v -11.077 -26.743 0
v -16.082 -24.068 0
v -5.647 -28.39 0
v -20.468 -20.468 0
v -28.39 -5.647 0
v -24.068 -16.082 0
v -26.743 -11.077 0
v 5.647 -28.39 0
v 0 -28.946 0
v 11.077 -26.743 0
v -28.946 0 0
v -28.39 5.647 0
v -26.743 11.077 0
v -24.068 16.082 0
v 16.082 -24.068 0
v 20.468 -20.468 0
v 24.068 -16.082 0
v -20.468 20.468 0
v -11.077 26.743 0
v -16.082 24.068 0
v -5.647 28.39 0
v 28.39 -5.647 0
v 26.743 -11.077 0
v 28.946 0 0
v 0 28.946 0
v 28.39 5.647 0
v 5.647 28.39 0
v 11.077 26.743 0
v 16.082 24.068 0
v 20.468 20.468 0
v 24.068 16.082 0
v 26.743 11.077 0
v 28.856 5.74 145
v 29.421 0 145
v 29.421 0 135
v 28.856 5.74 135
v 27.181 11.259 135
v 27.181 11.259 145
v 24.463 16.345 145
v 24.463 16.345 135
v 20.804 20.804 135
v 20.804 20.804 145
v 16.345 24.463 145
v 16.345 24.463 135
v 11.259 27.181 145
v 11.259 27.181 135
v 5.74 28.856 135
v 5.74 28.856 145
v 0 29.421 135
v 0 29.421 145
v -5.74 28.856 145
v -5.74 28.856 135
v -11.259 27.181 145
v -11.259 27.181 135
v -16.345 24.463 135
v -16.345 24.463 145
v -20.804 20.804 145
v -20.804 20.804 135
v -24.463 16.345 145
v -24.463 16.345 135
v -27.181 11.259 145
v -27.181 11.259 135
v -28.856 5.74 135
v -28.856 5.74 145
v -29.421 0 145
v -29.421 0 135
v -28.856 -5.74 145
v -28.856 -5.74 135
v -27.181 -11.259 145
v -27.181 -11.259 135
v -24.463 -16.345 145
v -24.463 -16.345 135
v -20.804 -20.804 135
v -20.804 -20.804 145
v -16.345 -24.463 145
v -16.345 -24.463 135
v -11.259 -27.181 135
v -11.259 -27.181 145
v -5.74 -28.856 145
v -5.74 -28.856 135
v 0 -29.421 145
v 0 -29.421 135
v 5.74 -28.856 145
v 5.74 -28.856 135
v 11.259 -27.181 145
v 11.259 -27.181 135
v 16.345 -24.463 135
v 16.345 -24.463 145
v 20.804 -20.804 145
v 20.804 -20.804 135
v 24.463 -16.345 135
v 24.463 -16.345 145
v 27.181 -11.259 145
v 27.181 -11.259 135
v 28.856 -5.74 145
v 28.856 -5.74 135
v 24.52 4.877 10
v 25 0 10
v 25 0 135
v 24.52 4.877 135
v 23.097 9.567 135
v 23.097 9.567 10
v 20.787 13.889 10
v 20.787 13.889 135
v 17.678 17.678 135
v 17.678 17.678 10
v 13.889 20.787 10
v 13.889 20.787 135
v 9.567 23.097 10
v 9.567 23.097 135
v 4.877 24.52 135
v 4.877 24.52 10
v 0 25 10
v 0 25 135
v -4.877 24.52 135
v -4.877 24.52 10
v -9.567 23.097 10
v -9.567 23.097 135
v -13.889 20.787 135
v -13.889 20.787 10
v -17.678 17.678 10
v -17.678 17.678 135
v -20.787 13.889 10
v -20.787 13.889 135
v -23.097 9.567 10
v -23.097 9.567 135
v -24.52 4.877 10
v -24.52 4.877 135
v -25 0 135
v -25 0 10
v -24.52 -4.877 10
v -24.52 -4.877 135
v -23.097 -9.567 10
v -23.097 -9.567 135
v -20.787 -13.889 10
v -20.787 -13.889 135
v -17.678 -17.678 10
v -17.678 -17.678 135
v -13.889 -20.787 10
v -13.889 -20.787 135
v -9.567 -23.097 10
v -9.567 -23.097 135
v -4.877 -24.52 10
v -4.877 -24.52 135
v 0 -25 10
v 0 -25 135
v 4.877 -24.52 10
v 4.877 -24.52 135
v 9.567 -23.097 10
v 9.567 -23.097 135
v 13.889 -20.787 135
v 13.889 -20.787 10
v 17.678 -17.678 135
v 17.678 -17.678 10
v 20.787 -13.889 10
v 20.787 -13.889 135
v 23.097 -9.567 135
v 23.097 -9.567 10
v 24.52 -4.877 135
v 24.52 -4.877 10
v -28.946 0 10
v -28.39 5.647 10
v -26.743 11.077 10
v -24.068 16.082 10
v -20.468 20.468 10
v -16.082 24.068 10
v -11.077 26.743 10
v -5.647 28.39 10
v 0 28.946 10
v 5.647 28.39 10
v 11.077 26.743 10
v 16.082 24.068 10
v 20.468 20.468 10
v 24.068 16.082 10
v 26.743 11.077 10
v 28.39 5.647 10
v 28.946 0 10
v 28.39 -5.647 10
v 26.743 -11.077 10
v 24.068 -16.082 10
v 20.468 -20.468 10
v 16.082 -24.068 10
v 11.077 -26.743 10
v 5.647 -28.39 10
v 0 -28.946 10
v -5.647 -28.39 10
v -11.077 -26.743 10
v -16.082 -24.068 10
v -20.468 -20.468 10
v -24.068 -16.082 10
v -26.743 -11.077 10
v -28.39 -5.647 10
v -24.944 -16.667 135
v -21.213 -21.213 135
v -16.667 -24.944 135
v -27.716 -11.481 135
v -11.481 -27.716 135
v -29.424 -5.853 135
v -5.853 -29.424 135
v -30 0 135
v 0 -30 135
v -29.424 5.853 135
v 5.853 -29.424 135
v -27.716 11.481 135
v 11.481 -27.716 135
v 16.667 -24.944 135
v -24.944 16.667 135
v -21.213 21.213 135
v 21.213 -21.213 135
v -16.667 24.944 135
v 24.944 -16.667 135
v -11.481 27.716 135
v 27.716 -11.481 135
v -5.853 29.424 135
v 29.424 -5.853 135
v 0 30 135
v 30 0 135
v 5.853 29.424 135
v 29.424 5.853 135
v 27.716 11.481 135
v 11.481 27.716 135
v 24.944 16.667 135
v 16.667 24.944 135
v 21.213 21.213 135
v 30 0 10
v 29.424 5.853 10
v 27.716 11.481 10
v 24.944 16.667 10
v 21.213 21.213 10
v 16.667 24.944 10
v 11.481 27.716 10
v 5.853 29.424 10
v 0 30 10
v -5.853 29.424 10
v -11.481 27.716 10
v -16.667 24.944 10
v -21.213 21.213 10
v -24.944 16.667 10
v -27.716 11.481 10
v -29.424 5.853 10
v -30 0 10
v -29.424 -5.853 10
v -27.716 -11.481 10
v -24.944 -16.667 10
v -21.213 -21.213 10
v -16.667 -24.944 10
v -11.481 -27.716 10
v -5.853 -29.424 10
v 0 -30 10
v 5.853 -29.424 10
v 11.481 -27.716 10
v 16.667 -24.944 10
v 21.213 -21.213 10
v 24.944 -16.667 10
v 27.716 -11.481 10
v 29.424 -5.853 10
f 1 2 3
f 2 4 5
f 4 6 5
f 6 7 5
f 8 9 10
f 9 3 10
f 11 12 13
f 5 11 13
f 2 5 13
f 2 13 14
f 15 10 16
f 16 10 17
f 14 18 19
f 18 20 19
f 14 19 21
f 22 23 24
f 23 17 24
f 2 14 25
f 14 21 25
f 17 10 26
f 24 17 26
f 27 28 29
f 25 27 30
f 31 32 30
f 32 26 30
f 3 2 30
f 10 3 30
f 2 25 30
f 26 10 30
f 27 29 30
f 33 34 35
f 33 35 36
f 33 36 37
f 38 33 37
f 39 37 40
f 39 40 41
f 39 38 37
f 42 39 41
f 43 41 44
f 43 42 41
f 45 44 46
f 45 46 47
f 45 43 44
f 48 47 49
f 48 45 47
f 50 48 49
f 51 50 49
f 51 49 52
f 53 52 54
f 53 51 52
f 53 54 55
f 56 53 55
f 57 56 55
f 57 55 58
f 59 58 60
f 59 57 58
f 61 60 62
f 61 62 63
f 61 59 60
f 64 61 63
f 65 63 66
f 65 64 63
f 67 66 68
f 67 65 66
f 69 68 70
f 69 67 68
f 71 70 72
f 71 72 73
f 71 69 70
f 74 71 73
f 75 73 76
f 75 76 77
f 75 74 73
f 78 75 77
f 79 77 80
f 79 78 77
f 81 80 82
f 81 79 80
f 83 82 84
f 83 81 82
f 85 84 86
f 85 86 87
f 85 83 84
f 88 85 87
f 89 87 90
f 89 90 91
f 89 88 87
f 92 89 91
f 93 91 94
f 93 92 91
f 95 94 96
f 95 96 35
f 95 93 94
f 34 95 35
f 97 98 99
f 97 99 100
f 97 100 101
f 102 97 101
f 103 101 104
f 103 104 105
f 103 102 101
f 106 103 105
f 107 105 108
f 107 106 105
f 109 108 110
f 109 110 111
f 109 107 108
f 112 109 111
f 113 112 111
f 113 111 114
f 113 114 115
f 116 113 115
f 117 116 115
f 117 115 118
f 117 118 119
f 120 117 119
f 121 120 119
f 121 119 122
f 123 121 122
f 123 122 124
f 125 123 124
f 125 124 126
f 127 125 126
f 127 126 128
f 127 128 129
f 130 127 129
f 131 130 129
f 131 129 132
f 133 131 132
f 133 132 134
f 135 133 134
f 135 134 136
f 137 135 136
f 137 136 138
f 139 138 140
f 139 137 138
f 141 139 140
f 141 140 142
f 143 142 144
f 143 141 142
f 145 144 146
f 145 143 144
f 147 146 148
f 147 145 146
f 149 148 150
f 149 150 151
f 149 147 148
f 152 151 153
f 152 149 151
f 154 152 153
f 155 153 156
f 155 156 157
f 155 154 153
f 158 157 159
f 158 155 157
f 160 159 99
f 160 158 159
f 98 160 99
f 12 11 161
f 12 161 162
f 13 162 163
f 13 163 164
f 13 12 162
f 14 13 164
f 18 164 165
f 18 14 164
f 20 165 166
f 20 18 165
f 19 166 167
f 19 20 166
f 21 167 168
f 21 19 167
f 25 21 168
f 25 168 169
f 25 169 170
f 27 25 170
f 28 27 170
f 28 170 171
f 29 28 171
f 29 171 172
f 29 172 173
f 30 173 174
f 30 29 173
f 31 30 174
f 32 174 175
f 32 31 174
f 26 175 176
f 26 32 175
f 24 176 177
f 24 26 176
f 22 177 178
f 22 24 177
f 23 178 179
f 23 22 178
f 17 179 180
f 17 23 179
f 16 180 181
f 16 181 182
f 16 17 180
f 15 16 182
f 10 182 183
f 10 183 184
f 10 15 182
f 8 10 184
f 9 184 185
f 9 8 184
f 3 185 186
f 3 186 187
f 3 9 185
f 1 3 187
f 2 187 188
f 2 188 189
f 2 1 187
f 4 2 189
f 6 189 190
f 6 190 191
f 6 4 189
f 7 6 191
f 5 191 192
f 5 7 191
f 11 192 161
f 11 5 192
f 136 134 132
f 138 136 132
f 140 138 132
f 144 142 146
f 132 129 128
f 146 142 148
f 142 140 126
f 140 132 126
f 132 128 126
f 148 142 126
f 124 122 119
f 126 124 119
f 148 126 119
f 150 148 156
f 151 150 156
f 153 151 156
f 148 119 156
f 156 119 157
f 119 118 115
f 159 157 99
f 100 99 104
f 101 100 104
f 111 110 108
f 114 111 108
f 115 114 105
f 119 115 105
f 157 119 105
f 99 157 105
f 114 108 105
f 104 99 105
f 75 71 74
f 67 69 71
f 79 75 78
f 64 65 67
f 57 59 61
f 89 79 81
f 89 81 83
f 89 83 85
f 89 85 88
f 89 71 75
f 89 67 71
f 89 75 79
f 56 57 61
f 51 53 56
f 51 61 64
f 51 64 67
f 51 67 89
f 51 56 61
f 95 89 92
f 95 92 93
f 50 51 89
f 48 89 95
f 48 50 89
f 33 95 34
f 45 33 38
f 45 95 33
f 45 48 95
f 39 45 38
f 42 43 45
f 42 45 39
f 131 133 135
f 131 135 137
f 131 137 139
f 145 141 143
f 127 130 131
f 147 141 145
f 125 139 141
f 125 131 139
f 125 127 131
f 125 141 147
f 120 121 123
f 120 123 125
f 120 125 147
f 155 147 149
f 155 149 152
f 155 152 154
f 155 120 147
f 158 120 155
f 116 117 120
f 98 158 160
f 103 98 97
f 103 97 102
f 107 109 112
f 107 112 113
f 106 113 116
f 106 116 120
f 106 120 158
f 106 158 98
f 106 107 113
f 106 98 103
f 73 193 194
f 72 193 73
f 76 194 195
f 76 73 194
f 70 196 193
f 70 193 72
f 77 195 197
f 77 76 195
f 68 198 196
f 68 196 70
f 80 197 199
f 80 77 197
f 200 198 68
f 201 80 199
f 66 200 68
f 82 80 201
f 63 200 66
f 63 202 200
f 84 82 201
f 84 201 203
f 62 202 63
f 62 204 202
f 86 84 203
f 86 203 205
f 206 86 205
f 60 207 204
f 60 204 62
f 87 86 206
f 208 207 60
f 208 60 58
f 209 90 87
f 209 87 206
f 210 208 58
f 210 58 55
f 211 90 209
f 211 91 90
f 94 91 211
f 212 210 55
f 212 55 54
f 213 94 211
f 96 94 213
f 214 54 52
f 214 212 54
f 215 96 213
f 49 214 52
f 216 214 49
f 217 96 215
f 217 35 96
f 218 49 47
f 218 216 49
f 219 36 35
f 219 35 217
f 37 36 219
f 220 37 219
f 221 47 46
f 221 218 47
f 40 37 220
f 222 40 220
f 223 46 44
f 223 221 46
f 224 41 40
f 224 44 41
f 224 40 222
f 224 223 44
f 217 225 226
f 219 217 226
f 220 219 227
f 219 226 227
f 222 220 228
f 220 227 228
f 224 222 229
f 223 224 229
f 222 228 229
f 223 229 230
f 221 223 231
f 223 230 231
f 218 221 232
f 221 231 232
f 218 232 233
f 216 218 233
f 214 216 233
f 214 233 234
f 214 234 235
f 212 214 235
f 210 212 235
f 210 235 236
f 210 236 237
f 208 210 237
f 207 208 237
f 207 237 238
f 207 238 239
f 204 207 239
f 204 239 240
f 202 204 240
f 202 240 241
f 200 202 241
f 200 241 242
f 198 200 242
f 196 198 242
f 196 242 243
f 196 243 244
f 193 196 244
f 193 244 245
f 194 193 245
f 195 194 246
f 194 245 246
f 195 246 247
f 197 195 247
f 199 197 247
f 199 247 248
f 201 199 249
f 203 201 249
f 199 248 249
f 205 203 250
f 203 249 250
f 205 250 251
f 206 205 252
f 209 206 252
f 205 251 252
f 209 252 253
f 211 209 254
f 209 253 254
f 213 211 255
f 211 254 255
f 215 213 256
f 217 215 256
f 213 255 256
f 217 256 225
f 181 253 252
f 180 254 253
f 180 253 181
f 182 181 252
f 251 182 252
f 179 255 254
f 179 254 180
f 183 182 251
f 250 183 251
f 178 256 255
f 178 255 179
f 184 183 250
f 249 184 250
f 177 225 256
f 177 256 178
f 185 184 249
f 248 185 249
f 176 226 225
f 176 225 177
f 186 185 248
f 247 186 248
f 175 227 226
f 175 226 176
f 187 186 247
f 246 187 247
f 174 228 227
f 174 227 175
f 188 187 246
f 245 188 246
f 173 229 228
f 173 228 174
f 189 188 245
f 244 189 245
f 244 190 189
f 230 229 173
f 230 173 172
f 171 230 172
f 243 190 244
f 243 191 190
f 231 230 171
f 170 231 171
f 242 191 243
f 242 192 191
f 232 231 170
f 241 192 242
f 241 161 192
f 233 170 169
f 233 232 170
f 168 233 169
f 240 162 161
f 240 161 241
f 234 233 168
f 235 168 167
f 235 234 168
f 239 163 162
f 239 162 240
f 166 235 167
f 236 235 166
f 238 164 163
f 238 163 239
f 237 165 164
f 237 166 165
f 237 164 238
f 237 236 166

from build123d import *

# Parameters (mm, degrees)
SKETCH1_R           = 30
SKETCH1_R_2         = 25
BOSS_EXTRUDE1_DEPTH = 145
SKETCH2_R           = 25
BOSS_EXTRUDE2_DEPTH = 10
SKETCH3_R           = 25
BOSS_EXTRUDE3_DEPTH = 10
SKETCH11_R          = 30
SKETCH11_R_2        = 28.945980101
CUT_EXTRUDE2_DEPTH  = 10
SKETCH12_R          = 30
SKETCH12_R_2        = 29.420954363
CUT_EXTRUDE3_DEPTH  = 10


with BuildPart() as part:
    # Sketch1 → Boss-Extrude1 (new body)
    with BuildSketch(Plane.XY):
        Circle(SKETCH1_R)
        Circle(SKETCH1_R_2, mode=Mode.SUBTRACT)
    extrude(amount=BOSS_EXTRUDE1_DEPTH)

    # Sketch2 → Boss-Extrude2 (add)
    with BuildSketch(Plane.XY):
        Circle(SKETCH2_R)
    extrude(amount=BOSS_EXTRUDE2_DEPTH)

    # Sketch3 → Boss-Extrude3 (add)
    with BuildSketch(Plane.XY.offset(135)):
        Circle(SKETCH3_R)
    extrude(amount=BOSS_EXTRUDE3_DEPTH)

    # Sketch11 → Cut-Extrude2 (cut)
    with BuildSketch(Plane(origin=(0, 0, 0), x_dir=(-1, 0, 0), z_dir=(0, 0, -1))):
        Circle(SKETCH11_R)
        Circle(SKETCH11_R_2, mode=Mode.SUBTRACT)
    extrude(amount=-CUT_EXTRUDE2_DEPTH, mode=Mode.SUBTRACT)

    # Sketch12 → Cut-Extrude3 (cut)
    with BuildSketch(Plane.XY.offset(145)):
        Circle(SKETCH12_R)
        Circle(SKETCH12_R_2, mode=Mode.SUBTRACT)
    extrude(amount=-CUT_EXTRUDE3_DEPTH, mode=Mode.SUBTRACT)


solid = part.part
